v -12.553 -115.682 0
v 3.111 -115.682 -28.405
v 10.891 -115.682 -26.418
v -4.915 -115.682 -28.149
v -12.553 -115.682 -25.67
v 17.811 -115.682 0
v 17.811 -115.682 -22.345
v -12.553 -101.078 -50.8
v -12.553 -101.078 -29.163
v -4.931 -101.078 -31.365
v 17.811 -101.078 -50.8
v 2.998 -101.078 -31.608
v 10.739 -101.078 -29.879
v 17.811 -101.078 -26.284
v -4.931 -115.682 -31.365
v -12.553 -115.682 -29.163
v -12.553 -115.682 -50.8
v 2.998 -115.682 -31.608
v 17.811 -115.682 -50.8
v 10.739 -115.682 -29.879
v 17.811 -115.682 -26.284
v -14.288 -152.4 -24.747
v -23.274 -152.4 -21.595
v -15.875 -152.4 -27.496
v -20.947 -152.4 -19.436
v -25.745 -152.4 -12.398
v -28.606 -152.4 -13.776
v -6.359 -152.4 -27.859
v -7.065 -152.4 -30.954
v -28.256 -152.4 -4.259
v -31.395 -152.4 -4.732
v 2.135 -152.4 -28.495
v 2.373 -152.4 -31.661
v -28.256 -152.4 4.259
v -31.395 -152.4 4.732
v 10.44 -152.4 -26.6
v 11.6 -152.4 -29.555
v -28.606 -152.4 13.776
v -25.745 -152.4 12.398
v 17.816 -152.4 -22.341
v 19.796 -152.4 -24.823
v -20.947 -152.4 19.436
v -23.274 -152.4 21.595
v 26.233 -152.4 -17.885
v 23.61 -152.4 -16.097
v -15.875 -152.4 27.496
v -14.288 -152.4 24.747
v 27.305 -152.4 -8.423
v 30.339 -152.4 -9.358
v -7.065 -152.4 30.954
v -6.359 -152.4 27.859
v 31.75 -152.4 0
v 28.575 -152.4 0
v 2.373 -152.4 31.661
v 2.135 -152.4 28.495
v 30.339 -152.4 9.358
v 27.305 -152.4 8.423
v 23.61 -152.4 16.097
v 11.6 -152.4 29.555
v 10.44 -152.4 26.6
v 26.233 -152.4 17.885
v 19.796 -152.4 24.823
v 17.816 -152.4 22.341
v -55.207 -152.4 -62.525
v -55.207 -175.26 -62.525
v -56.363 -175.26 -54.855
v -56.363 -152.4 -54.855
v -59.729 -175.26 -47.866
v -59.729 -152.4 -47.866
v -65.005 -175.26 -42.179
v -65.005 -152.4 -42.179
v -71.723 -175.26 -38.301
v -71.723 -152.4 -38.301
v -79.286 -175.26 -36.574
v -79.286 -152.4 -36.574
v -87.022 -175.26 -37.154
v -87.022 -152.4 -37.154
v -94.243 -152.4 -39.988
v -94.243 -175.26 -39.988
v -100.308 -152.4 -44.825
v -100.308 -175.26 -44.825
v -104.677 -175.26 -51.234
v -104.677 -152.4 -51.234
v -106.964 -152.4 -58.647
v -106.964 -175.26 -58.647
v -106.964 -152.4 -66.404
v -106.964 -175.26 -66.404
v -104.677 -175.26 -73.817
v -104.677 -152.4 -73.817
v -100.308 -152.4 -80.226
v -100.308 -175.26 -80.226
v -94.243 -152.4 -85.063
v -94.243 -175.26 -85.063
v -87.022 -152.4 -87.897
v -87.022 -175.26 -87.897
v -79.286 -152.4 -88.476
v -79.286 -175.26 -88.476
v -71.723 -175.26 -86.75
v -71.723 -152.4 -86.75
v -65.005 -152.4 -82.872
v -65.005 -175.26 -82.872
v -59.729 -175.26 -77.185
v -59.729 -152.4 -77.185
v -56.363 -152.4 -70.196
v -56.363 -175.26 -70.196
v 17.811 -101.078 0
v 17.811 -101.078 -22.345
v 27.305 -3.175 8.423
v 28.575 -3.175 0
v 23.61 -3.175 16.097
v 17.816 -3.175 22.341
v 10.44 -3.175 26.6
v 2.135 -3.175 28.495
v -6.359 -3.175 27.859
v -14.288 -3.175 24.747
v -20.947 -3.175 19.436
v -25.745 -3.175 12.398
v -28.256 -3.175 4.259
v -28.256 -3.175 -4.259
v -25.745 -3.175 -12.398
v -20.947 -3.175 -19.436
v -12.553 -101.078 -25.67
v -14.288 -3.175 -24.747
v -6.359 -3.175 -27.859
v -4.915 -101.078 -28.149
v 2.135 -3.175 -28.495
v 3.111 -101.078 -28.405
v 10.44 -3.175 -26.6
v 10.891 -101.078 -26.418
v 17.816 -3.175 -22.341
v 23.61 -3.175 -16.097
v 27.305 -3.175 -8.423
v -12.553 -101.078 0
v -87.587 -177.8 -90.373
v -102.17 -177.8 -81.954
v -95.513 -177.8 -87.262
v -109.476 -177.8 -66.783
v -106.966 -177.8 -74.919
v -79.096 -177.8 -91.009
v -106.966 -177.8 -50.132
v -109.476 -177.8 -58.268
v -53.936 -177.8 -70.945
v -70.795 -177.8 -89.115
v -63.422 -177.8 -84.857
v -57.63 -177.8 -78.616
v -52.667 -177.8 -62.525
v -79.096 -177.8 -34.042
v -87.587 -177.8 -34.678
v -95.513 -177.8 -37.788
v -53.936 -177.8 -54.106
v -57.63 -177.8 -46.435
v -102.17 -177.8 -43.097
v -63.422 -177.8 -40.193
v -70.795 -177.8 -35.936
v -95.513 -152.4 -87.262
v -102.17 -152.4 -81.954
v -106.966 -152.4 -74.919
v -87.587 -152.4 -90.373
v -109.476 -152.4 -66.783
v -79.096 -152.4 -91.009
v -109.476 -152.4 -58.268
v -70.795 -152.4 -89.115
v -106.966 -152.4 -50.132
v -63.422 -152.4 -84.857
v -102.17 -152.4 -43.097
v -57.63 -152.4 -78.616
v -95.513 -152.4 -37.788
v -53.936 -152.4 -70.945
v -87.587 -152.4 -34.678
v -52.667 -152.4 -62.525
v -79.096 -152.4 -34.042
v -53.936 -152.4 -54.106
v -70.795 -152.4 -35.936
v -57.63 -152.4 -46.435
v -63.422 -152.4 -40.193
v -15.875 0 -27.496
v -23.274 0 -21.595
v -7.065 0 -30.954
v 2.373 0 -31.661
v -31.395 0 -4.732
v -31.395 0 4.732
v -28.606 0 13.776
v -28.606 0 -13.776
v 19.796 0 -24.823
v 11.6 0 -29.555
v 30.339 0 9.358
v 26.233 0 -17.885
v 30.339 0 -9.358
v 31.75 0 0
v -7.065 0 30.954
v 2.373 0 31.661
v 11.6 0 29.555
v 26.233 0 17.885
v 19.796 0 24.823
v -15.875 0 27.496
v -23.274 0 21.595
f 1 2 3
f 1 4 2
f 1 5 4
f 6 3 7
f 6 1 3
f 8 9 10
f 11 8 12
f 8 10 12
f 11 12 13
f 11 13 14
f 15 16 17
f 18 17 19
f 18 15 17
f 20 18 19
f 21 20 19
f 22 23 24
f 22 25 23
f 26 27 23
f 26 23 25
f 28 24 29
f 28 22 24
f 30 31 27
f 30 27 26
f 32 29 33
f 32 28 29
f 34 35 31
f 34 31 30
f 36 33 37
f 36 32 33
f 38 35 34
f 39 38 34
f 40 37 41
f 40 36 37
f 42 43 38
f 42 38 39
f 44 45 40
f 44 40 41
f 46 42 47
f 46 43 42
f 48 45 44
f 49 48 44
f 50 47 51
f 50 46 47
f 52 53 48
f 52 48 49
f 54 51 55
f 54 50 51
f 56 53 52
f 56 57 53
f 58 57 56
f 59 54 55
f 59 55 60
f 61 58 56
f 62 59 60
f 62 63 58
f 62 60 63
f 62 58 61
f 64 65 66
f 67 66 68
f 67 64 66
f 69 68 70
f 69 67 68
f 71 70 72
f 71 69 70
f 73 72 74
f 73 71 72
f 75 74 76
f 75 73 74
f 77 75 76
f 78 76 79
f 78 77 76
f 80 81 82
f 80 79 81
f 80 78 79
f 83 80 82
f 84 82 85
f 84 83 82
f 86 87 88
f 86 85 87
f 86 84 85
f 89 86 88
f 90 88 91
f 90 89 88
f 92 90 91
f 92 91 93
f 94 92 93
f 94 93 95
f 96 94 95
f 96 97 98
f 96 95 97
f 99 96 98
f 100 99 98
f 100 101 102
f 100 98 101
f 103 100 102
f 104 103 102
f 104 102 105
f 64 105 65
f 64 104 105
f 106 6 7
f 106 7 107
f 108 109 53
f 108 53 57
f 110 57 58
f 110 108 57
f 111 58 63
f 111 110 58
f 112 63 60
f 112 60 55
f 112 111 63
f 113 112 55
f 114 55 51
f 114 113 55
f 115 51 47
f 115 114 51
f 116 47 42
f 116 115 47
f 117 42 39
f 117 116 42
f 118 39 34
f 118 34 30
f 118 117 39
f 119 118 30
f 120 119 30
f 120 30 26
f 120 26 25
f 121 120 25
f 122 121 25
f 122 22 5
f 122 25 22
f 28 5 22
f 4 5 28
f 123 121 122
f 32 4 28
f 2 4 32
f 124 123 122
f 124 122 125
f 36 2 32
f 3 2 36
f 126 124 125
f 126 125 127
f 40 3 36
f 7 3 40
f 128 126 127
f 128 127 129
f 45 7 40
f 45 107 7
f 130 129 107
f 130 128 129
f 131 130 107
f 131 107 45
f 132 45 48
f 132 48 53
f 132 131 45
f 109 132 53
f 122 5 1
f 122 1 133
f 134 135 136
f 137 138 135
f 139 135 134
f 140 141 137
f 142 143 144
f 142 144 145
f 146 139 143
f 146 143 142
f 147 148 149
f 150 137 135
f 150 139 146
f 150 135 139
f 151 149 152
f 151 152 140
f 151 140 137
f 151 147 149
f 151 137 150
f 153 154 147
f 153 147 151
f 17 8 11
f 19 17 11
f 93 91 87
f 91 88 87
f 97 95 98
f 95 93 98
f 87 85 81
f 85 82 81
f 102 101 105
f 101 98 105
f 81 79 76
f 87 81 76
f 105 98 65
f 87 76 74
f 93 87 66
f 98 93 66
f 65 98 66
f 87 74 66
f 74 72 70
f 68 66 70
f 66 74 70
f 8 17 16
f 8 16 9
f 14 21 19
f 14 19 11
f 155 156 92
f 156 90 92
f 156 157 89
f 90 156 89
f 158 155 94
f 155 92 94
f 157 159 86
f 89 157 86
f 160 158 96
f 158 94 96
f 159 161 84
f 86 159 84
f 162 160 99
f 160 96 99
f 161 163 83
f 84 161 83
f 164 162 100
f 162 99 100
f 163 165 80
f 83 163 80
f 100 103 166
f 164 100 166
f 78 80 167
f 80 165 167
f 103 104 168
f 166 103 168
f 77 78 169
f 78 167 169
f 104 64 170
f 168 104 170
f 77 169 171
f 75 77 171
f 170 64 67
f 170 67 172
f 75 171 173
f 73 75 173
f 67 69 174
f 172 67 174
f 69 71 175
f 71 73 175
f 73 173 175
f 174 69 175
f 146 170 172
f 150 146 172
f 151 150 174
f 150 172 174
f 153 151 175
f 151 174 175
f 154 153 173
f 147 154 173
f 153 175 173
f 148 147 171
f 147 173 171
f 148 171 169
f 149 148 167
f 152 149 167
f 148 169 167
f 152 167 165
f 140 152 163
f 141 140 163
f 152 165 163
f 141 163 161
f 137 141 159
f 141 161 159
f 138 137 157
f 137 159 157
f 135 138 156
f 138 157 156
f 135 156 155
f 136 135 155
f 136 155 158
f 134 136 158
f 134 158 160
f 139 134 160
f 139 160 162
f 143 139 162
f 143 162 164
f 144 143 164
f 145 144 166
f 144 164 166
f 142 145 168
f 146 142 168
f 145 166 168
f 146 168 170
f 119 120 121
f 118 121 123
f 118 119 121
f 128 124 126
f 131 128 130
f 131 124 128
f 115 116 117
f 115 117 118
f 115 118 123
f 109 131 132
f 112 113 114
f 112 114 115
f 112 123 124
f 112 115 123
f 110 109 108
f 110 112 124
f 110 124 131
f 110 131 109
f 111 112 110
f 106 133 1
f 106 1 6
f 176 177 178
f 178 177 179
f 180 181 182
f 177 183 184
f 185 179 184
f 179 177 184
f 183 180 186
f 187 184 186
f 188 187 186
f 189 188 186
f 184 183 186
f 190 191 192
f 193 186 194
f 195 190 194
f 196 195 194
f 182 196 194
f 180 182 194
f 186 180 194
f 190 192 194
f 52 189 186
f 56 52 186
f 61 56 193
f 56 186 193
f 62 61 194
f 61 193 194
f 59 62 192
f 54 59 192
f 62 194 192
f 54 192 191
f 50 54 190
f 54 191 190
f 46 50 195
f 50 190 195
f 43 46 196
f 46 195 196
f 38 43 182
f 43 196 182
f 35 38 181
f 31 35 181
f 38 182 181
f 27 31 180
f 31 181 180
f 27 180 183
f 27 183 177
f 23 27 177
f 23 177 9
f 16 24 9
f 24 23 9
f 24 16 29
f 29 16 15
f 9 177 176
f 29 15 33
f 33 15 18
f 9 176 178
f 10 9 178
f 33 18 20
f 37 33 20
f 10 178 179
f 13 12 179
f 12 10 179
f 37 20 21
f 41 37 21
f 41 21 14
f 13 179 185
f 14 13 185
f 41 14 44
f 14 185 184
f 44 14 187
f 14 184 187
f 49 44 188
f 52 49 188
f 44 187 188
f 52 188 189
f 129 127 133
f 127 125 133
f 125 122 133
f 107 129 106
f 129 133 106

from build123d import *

# Parameters (mm, degrees)
F0_R     = 28.575
F1_DEPTH = 3.175
F0_R_2   = 31.75
F2_DEPTH = 152.4
F3_R     = 28.563714
F4_DEPTH = 25.4
F5_T     = -2.54
F6_W     = 30.363464
F6_H     = 14.604605
F7_DEPTH = 50.8


with BuildPart() as f1:
    # F0 (on Front) → F1 (new body)
    with BuildSketch(Plane.XZ):
        Circle(F0_R)
    extrude(amount=F1_DEPTH)

    # F0 (on Front) → F2 (join)
    with BuildSketch(Plane.XZ):
        Circle(F0_R_2)
        Circle(F0_R, mode=Mode.SUBTRACT)
    extrude(amount=F2_DEPTH)

    # F6 (on Top) → F7 (join)
    with BuildSketch(Plane.XY):
        with Locations((2.629106, -108.38009)):
            Rectangle(F6_W, F6_H)
    extrude(amount=-F7_DEPTH)


with BuildPart() as f4:
    # F3 (on face) → F4 (new body)
    with BuildSketch(Plane.XZ.offset(152.4)):
        with Locations((-81.230834, -62.525399)):
            Circle(F3_R)
    extrude(amount=F4_DEPTH)

    # F5
    f5_openings = [f4.faces().sort_by_distance(p)[0] for p in [
        (-81.230834, -152.4, -62.525399),
    ]]
    offset(amount=F5_T, openings=f5_openings)


solid = Compound([f1.part, f4.part])
